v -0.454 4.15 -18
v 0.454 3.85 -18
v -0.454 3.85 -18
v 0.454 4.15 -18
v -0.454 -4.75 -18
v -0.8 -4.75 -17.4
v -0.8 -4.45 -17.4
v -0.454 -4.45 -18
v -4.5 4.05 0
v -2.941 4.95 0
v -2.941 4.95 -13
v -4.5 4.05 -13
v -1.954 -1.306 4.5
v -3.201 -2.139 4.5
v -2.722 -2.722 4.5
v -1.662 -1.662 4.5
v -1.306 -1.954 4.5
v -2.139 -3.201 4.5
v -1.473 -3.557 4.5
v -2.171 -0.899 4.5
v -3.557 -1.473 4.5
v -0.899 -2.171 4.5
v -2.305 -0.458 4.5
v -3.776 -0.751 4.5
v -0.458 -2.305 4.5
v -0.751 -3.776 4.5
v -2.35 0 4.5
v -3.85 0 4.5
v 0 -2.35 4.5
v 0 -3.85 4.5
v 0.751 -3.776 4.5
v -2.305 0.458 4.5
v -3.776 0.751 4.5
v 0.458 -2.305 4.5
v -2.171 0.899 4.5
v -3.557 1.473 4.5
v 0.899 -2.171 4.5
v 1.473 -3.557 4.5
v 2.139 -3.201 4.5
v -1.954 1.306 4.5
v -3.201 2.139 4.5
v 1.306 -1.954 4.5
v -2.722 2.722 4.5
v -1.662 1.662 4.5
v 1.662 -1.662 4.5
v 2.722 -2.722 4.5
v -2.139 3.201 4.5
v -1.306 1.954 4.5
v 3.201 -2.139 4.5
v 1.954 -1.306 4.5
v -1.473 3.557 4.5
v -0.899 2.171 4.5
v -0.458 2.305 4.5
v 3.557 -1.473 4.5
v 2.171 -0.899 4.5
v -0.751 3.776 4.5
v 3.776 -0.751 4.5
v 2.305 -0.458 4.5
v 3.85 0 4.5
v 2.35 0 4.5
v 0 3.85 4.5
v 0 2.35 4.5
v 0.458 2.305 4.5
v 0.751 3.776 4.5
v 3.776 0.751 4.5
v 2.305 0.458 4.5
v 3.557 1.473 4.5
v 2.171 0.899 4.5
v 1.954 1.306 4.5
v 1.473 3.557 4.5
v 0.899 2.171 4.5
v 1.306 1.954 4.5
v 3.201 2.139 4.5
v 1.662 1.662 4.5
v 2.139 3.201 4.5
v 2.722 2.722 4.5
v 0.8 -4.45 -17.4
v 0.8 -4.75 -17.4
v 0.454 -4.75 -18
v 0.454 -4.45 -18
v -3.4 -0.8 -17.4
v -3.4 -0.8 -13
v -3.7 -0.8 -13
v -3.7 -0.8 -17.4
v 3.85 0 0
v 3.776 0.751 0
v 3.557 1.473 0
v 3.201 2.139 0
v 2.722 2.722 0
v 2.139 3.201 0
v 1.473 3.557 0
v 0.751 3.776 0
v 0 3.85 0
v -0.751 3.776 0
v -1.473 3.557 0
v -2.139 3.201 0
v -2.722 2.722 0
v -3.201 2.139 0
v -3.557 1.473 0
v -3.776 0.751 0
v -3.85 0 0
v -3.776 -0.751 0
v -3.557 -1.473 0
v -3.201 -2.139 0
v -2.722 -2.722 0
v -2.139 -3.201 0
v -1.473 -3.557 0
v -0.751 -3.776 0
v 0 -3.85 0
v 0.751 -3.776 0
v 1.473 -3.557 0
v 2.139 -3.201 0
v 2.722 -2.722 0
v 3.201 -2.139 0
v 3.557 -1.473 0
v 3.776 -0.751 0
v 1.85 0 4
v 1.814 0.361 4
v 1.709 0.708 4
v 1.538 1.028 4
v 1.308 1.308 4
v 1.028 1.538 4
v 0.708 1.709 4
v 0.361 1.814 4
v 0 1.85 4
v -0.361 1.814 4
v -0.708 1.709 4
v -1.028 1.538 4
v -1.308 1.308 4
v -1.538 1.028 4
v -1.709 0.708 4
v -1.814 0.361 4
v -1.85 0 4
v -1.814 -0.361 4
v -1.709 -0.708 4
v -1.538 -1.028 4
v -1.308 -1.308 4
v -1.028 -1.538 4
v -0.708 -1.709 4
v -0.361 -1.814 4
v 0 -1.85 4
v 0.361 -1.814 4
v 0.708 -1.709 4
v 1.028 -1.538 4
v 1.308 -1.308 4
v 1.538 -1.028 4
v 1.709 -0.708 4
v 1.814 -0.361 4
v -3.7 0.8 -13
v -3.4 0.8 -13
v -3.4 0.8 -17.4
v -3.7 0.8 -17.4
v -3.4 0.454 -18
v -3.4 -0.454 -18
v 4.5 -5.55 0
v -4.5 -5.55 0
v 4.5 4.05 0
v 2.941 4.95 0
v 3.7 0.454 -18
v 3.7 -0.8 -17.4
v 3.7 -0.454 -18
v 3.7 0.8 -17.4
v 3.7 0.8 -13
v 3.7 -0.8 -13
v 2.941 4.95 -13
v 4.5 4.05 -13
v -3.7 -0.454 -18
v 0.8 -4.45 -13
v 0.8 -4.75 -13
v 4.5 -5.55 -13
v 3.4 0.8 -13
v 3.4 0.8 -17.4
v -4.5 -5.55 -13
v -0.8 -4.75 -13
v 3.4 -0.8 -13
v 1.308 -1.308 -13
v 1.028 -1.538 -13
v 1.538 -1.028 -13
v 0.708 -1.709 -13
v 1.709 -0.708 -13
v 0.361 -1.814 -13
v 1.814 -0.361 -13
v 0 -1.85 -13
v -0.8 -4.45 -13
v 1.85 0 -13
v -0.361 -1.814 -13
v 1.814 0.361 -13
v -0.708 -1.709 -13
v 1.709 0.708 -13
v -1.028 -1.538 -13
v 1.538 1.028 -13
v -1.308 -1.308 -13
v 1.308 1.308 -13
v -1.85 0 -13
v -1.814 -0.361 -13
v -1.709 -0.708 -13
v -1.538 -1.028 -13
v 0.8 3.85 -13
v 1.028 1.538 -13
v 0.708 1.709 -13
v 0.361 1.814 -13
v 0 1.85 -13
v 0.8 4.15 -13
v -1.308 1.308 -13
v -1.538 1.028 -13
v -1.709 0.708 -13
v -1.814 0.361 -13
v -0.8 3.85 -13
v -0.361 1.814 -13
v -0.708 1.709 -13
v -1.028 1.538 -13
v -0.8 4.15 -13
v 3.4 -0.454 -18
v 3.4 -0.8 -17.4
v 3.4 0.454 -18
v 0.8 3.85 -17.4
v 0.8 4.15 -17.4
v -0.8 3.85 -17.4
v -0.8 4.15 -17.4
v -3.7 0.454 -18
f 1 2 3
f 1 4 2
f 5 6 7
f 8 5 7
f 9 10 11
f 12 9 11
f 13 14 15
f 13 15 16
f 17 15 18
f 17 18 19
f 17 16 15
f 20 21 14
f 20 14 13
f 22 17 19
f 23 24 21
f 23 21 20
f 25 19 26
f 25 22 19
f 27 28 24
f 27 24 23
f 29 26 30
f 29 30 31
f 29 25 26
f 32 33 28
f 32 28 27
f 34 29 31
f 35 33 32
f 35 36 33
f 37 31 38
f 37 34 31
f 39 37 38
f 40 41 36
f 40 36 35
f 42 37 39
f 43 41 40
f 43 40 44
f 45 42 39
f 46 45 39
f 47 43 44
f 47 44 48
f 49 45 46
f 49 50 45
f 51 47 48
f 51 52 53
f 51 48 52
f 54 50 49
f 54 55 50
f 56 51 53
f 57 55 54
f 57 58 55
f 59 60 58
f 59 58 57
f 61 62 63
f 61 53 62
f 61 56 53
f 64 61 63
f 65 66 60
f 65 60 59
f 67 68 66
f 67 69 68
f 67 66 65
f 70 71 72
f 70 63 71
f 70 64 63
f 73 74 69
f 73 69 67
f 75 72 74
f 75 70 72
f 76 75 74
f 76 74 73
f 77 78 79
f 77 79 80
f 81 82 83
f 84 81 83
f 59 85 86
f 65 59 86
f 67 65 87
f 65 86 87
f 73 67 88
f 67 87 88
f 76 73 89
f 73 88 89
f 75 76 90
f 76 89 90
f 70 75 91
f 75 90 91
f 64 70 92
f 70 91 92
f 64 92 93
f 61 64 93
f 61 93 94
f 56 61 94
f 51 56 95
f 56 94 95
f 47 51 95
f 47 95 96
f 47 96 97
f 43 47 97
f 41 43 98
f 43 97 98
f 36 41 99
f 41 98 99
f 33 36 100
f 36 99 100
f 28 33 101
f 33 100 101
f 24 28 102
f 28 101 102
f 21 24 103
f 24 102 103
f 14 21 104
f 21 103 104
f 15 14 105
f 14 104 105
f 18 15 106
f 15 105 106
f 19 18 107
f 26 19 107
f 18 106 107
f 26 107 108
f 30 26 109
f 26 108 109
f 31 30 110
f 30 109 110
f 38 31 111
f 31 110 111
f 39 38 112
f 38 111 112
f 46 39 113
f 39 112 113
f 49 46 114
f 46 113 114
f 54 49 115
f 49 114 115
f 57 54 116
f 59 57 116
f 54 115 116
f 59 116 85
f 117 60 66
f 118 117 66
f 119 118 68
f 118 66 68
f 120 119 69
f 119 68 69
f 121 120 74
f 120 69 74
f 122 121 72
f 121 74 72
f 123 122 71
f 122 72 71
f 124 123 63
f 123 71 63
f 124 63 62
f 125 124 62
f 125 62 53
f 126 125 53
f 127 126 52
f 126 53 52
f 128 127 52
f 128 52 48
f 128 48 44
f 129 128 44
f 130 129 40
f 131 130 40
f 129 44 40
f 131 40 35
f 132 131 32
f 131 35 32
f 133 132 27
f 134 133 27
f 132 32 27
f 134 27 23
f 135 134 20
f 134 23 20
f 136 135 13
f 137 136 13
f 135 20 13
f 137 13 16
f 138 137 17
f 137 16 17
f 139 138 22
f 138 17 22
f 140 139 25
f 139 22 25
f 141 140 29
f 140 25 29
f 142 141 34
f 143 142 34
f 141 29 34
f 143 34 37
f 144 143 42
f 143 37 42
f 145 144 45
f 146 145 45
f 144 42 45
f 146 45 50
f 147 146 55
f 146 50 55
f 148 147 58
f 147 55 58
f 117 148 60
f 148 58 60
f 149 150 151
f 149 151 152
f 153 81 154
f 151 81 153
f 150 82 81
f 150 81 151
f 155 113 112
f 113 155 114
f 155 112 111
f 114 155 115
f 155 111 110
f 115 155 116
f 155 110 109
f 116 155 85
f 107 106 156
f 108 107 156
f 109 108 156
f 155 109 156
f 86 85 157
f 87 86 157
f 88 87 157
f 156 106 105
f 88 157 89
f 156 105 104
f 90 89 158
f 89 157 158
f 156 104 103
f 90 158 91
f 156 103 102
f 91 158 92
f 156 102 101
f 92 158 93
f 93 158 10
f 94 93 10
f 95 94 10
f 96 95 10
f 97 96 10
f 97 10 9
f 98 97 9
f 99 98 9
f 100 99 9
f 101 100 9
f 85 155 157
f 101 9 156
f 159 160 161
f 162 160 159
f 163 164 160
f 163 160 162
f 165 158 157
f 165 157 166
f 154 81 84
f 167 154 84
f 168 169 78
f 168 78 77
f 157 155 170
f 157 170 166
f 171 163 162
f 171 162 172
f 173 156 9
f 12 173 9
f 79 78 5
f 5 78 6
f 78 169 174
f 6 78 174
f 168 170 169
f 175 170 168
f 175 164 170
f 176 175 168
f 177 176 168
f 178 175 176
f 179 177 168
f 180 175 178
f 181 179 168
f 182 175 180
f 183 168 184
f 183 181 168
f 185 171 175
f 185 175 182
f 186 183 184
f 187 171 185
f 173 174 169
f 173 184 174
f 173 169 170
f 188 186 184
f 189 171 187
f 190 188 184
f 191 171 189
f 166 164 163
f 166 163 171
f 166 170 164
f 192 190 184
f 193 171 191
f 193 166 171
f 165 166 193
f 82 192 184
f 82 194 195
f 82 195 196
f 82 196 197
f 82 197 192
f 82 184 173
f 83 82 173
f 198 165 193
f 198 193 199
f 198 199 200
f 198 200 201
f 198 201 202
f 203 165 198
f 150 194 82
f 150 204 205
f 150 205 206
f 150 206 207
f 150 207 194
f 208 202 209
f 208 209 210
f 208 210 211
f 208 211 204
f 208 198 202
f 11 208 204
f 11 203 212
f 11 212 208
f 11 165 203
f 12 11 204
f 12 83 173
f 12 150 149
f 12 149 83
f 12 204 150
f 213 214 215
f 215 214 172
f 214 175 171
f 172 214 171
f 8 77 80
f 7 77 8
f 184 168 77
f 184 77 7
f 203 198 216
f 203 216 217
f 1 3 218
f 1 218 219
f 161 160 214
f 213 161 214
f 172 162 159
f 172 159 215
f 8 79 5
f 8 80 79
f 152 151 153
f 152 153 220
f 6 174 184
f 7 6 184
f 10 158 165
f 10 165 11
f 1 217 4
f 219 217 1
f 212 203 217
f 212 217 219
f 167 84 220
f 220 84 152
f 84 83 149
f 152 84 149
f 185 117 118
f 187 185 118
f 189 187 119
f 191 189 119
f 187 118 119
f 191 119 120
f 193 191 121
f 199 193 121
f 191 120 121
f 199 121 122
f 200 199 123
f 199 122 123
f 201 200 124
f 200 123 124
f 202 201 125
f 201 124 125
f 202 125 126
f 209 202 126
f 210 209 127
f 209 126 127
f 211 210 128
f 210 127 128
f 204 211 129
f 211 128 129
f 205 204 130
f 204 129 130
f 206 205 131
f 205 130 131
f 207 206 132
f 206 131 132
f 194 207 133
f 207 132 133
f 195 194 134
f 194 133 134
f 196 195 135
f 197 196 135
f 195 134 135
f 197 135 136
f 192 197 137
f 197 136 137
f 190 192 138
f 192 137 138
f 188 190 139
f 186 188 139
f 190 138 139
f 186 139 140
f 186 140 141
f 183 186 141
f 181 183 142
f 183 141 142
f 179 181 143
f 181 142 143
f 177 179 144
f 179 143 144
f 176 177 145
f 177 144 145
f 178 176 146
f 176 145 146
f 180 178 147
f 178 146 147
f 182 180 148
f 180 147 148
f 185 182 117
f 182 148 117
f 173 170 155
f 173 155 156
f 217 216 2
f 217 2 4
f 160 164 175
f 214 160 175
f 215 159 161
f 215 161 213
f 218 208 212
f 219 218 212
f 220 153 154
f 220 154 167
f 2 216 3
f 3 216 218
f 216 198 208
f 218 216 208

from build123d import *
from OCP.BRepFilletAPI import BRepFilletAPI_MakeChamfer

# Parameters (mm, degrees)
SKETCH1_R           = 3.85
BOSS_EXTRUDE1_DEPTH = 4.5
SKETCH2_W           = 9
SKETCH2_H           = 10.5
BOSS_EXTRUDE2_DEPTH = 13
CHAMFER1_SIZE       = 0.9
CHAMFER1_SIZE2      = 1.558845727
SKETCH3_W           = 1.6
SKETCH3_H           = 0.3
SKETCH3_W_2         = 0.3
SKETCH3_H_2         = 1.6
BOSS_EXTRUDE3_DEPTH = 5
CHAMFER2_SIZE       = 0.6
CHAMFER2_SIZE2      = 0.346410162
SKETCH4_R           = 1.85
CUT_EXTRUDE1_DEPTH  = 17.5
CHAMFER3_SIZE       = 0.5


with BuildPart() as part:
    # Sketch1 → Boss-Extrude1 (new body)
    with BuildSketch(Plane.XY):
        Circle(SKETCH1_R)
    extrude(amount=BOSS_EXTRUDE1_DEPTH)

    # Sketch2 → Boss-Extrude2 (add)
    with BuildSketch(Plane(origin=(0, 0, 0), x_dir=(-1, 0, 0), z_dir=(0, 0, -1))):
        with Locations((0, -0.3)):
            Rectangle(SKETCH2_W, SKETCH2_H)
    extrude(amount=BOSS_EXTRUDE2_DEPTH)

    # Chamfer1: one chamfer whose edges measure the first distance from different faces: ONE call of the kernel's chamfer builder (chamfer() names one face for all edges)
    chamfer1_edges_1 = [part.edges().sort_by_distance(p)[0] for p in [
        (-4.5, 4.95, -6.5),
    ]]
    chamfer1_side_1 = [part.faces().sort_by_distance(p)[0] for p in [
        (-4.5, -0.3, -6.5),
    ]]
    chamfer1_edges_2 = [part.edges().sort_by_distance(p)[0] for p in [
        (4.5, 4.95, -6.5),
    ]]
    chamfer1_side_2 = [part.faces().sort_by_distance(p)[0] for p in [
        (4.5, -0.3, -6.5),
    ]]
    chamfer1 = BRepFilletAPI_MakeChamfer(part.part.solid().wrapped)
    for e in chamfer1_edges_1:
        chamfer1.Add(CHAMFER1_SIZE, CHAMFER1_SIZE2, e.wrapped, chamfer1_side_1[0].wrapped)  # the first distance lies on this face
    for e in chamfer1_edges_2:
        chamfer1.Add(CHAMFER1_SIZE, CHAMFER1_SIZE2, e.wrapped, chamfer1_side_2[0].wrapped)  # the first distance lies on this face
    add(Compound.cast(chamfer1.Shape()), mode=Mode.REPLACE)

    # Sketch3 → Boss-Extrude3 (add)
    with BuildSketch(Plane(origin=(0, 0, -13), x_dir=(-1, 0, 0), z_dir=(0, 0, -1))):
        with Locations((0, 4)):
            Rectangle(SKETCH3_W, SKETCH3_H)
        with Locations((3.55, 0)):
            Rectangle(SKETCH3_W_2, SKETCH3_H_2)
        with Locations((-3.55, 0)):
            Rectangle(SKETCH3_W_2, SKETCH3_H_2)
        with Locations((0, -4.6)):
            Rectangle(SKETCH3_W, SKETCH3_H)
    extrude(amount=BOSS_EXTRUDE3_DEPTH)

    # Chamfer2: one chamfer whose edges measure the first distance from different faces: ONE call of the kernel's chamfer builder (chamfer() names one face for all edges)
    chamfer2_edges_1 = [part.edges().sort_by_distance(p)[0] for p in [
        (0.8, 4, -18),
    ]]
    chamfer2_side_1 = [part.faces().sort_by_distance(p)[0] for p in [
        (0.8, 4, -15.5),
    ]]
    chamfer2_edges_2 = [part.edges().sort_by_distance(p)[0] for p in [
        (-0.8, 4, -18),
    ]]
    chamfer2_side_2 = [part.faces().sort_by_distance(p)[0] for p in [
        (-0.8, 4, -15.5),
    ]]
    chamfer2_edges_3 = [part.edges().sort_by_distance(p)[0] for p in [
        (-3.55, -0.8, -18),
    ]]
    chamfer2_side_3 = [part.faces().sort_by_distance(p)[0] for p in [
        (-3.55, -0.8, -15.5),
    ]]
    chamfer2_edges_4 = [part.edges().sort_by_distance(p)[0] for p in [
        (-3.55, 0.8, -18),
    ]]
    chamfer2_side_4 = [part.faces().sort_by_distance(p)[0] for p in [
        (-3.55, 0.8, -15.5),
    ]]
    chamfer2_edges_5 = [part.edges().sort_by_distance(p)[0] for p in [
        (3.55, -0.8, -18),
    ]]
    chamfer2_side_5 = [part.faces().sort_by_distance(p)[0] for p in [
        (3.55, -0.8, -15.5),
    ]]
    chamfer2_edges_6 = [part.edges().sort_by_distance(p)[0] for p in [
        (3.55, 0.8, -18),
    ]]
    chamfer2_side_6 = [part.faces().sort_by_distance(p)[0] for p in [
        (3.55, 0.8, -15.5),
    ]]
    chamfer2_edges_7 = [part.edges().sort_by_distance(p)[0] for p in [
        (0.8, -4.6, -18),
    ]]
    chamfer2_side_7 = [part.faces().sort_by_distance(p)[0] for p in [
        (0.8, -4.6, -15.5),
    ]]
    chamfer2_edges_8 = [part.edges().sort_by_distance(p)[0] for p in [
        (-0.8, -4.6, -18),
    ]]
    chamfer2_side_8 = [part.faces().sort_by_distance(p)[0] for p in [
        (-0.8, -4.6, -15.5),
    ]]
    chamfer2 = BRepFilletAPI_MakeChamfer(part.part.solid().wrapped)
    for e in chamfer2_edges_1:
        chamfer2.Add(CHAMFER2_SIZE, CHAMFER2_SIZE2, e.wrapped, chamfer2_side_1[0].wrapped)  # the first distance lies on this face
    for e in chamfer2_edges_2:
        chamfer2.Add(CHAMFER2_SIZE, CHAMFER2_SIZE2, e.wrapped, chamfer2_side_2[0].wrapped)  # the first distance lies on this face
    for e in chamfer2_edges_3:
        chamfer2.Add(CHAMFER2_SIZE, CHAMFER2_SIZE2, e.wrapped, chamfer2_side_3[0].wrapped)  # the first distance lies on this face
    for e in chamfer2_edges_4:
        chamfer2.Add(CHAMFER2_SIZE, CHAMFER2_SIZE2, e.wrapped, chamfer2_side_4[0].wrapped)  # the first distance lies on this face
    for e in chamfer2_edges_5:
        chamfer2.Add(CHAMFER2_SIZE, CHAMFER2_SIZE2, e.wrapped, chamfer2_side_5[0].wrapped)  # the first distance lies on this face
    for e in chamfer2_edges_6:
        chamfer2.Add(CHAMFER2_SIZE, CHAMFER2_SIZE2, e.wrapped, chamfer2_side_6[0].wrapped)  # the first distance lies on this face
    for e in chamfer2_edges_7:
        chamfer2.Add(CHAMFER2_SIZE, CHAMFER2_SIZE2, e.wrapped, chamfer2_side_7[0].wrapped)  # the first distance lies on this face
    for e in chamfer2_edges_8:
        chamfer2.Add(CHAMFER2_SIZE, CHAMFER2_SIZE2, e.wrapped, chamfer2_side_8[0].wrapped)  # the first distance lies on this face
    add(Compound.cast(chamfer2.Shape()), mode=Mode.REPLACE)

    # Sketch4 → Cut-Extrude1 (cut)
    with BuildSketch(Plane.XY.offset(4.5)):
        Circle(SKETCH4_R)
    extrude(amount=-CUT_EXTRUDE1_DEPTH, mode=Mode.SUBTRACT)

    # Chamfer3
    chamfer3_edges = [part.edges().sort_by_distance(p)[0] for p in [
        (-1.85, 0, 4.5),
    ]]
    chamfer(chamfer3_edges, length=CHAMFER3_SIZE)


solid = part.part
